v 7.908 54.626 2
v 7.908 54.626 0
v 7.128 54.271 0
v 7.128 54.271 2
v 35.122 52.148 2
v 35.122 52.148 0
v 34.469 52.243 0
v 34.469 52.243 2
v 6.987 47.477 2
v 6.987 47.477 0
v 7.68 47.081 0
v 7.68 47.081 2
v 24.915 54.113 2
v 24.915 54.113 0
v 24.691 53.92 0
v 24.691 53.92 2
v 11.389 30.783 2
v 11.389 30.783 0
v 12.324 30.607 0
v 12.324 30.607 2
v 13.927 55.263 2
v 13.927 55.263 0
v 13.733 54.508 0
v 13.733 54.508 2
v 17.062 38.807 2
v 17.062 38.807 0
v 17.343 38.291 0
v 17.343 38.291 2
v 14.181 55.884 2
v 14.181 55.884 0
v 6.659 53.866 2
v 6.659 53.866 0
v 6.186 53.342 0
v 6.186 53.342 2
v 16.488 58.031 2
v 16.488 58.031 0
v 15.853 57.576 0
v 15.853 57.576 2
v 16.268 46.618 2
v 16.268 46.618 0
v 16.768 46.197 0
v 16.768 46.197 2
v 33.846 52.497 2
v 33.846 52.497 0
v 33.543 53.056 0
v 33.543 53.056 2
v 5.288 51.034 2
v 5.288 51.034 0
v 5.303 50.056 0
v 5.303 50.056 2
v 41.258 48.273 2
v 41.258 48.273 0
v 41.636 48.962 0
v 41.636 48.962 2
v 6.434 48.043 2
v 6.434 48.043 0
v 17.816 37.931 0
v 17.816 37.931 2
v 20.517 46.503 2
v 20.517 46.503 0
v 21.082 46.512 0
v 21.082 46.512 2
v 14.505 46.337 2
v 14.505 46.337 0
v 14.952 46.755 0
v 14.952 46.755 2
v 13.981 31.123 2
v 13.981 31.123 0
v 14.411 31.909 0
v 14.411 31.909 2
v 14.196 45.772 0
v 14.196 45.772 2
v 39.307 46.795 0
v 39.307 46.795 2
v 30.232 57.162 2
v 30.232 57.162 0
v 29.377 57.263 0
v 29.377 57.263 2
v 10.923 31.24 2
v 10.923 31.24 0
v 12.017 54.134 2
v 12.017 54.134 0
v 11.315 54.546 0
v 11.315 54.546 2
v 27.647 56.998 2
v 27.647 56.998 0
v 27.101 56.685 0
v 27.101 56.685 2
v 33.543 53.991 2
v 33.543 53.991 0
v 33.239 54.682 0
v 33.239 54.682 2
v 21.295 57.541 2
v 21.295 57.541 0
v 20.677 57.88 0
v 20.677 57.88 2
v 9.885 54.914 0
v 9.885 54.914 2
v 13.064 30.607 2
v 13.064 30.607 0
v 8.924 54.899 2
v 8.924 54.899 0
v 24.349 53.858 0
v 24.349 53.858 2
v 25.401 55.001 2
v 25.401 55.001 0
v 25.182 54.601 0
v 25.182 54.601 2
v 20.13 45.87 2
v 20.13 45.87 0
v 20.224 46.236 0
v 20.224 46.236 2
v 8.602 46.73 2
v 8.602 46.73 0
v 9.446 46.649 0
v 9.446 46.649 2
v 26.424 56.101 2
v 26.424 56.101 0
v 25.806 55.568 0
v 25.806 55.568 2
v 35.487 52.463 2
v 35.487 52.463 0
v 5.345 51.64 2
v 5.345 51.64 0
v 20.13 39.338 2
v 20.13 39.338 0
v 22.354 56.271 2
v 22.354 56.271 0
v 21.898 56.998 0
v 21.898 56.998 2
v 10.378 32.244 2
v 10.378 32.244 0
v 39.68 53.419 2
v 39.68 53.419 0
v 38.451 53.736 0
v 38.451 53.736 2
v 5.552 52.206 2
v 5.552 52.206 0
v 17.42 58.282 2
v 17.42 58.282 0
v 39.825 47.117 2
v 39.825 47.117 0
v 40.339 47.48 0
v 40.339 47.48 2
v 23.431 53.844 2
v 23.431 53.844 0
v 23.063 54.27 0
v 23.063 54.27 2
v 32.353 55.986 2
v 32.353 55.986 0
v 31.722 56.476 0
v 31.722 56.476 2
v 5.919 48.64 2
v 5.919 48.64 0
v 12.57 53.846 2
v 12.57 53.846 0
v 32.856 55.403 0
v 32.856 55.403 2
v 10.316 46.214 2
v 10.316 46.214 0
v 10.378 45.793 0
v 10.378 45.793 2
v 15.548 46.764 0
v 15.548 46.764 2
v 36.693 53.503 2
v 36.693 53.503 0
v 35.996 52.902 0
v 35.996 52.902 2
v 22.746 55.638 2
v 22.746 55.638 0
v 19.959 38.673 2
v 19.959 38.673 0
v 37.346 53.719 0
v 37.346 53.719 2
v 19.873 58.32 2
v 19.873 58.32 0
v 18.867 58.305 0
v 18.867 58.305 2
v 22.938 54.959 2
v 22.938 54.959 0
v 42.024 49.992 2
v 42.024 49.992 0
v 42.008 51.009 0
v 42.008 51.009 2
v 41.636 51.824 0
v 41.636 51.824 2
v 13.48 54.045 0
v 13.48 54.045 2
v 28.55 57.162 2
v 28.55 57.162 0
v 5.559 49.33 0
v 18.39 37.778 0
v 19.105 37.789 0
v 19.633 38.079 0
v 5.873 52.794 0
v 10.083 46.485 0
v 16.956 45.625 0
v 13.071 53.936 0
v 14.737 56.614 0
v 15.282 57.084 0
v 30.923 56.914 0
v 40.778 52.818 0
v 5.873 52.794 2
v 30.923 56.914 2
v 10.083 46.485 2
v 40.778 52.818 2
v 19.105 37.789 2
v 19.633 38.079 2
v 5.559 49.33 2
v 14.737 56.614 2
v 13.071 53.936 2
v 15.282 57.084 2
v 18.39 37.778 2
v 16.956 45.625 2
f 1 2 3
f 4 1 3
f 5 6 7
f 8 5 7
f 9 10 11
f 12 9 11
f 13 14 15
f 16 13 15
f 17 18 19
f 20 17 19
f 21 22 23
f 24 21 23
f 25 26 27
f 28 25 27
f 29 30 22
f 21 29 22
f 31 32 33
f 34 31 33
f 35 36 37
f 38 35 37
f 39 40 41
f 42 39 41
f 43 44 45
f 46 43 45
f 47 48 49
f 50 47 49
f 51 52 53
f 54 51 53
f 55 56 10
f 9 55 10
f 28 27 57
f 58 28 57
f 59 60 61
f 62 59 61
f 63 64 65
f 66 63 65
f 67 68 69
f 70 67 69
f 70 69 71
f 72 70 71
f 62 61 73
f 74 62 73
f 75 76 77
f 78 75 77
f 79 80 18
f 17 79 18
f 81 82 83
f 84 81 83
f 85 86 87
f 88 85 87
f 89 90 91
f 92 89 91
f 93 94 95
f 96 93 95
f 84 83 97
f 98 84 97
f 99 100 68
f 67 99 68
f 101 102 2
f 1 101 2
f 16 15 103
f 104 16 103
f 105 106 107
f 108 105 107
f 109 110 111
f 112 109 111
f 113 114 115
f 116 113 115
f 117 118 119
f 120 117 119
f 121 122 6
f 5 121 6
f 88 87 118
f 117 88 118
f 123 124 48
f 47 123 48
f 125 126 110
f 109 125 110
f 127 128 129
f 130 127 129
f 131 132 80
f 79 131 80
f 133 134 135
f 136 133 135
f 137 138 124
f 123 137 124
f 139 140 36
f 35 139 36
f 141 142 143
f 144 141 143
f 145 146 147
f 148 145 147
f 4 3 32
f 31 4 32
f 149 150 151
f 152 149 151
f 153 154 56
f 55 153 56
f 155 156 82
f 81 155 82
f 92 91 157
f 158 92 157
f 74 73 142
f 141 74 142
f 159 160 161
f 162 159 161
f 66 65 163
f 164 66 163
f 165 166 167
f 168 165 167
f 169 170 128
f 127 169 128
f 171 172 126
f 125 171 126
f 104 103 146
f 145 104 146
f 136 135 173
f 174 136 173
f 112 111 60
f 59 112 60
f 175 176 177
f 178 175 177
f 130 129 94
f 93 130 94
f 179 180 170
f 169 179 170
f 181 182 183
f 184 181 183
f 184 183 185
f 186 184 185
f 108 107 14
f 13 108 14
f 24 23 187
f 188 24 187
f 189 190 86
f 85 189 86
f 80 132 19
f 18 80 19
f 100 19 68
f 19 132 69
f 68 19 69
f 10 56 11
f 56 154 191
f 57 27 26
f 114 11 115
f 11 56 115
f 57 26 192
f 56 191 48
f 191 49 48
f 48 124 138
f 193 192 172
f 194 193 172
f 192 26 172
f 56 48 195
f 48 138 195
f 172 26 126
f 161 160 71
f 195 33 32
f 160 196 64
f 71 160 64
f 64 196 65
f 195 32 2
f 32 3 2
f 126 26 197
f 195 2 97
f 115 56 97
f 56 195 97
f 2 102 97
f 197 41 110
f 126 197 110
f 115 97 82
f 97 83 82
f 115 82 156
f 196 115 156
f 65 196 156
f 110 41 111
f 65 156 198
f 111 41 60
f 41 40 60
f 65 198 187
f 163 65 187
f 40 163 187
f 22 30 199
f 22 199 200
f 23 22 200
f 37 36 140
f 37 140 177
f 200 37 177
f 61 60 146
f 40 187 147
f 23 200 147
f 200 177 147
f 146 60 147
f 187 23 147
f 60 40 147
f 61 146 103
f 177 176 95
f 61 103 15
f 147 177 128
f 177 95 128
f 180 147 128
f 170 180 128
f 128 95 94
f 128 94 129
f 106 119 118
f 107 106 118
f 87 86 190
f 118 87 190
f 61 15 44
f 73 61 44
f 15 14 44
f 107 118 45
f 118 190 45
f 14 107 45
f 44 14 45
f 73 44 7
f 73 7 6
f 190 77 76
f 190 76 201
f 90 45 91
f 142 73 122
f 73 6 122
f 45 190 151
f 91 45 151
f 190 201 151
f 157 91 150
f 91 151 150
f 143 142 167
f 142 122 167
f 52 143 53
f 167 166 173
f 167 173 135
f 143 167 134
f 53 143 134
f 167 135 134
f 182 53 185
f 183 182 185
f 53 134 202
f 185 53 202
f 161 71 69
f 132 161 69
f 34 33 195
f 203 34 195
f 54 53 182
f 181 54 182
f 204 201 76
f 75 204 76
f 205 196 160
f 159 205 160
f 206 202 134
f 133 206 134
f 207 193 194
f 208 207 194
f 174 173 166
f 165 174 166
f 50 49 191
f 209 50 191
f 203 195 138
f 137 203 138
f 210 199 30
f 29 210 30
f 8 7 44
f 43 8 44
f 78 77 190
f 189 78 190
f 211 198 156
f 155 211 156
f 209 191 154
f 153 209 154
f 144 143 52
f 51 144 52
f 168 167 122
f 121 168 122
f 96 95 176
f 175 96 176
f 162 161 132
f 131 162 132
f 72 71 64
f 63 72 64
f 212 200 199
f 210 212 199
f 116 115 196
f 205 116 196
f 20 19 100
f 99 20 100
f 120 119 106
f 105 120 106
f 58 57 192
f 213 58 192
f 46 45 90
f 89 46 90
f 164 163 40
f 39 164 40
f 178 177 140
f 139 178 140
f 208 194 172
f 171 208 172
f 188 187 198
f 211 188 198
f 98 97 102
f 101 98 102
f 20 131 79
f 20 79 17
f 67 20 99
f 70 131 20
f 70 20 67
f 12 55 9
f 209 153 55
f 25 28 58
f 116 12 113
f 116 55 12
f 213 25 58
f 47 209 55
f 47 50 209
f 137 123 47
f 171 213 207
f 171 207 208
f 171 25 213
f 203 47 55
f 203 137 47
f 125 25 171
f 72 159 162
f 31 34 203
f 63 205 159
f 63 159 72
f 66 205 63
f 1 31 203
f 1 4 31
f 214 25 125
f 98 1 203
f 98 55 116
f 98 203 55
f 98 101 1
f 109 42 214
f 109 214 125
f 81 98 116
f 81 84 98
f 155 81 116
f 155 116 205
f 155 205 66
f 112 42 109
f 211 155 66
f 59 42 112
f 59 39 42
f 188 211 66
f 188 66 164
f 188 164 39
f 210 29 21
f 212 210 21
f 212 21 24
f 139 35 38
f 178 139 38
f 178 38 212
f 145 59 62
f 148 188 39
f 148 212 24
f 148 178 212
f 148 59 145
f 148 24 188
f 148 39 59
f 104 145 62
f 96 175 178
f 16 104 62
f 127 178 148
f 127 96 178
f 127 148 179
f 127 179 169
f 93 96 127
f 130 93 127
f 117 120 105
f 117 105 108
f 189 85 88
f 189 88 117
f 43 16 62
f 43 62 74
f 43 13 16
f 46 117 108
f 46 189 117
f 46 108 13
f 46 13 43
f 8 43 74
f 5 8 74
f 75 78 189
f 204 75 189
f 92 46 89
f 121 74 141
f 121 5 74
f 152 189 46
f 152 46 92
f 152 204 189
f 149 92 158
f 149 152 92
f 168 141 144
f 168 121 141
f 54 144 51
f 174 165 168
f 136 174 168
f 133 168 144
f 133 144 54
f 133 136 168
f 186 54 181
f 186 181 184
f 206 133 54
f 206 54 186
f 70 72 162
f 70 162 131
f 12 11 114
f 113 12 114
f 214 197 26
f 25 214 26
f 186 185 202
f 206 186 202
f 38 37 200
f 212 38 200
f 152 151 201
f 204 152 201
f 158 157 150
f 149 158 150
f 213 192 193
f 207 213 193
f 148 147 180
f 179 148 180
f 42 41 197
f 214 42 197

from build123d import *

# Parameters (mm, degrees)
F1_DEPTH = 2


with BuildPart() as f1:
    # F0 (on Top) → F1 (new body)
    with BuildSketch(Plane.XY):
        Polygon((10.316424, 46.21381), (10.378422, 45.792866), (10.378422, 32.24406), (10.922515, 31.239605), (11.388969, 30.782871), (12.3236, 30.607224), (13.063584, 30.607224), (13.980744, 31.123197), (14.411193, 31.909108), (14.195969, 45.771692), (14.505405, 46.336659), (14.951889, 46.75483), (15.547823, 46.764082), (16.267732, 46.618171), (16.767925, 46.196714), (16.955901, 45.625031), (17.061751, 38.807264), (17.342532, 38.290832), (17.816337, 37.93142), (18.39029, 37.777532), (19.1046, 37.788622), (19.633163, 38.07852), (19.958686, 38.672859), (20.130083, 39.338022), (20.130083, 45.869723), (20.224372, 46.235643), (20.517316, 46.503272), (21.081642, 46.512033), (39.306525, 46.794985), (39.82532, 47.116615), (40.338621, 47.479954), (41.258305, 48.273247), (41.635639, 48.962181), (42.02386, 49.992487), (42.008081, 51.008835), (41.635639, 51.823597), (40.777957, 52.81793), (39.679653, 53.419479), (38.45059, 53.736179), (37.345576, 53.719023), (36.693033, 53.5032), (35.996381, 52.902289), (35.486977, 52.462892), (35.121937, 52.148019), (34.468539, 52.243274), (33.846248, 52.497253), (33.542935, 53.056076), (33.542935, 53.990863), (33.238664, 54.682236), (32.856002, 55.402562), (32.352884, 55.98584), (31.721991, 56.476444), (30.923305, 56.91389), (30.231845, 57.161622), (29.377455, 57.263315), (28.54972, 57.161622), (27.647492, 56.998174), (27.101057, 56.685288), (26.424225, 56.101473), (25.806281, 55.568452), (25.401196, 55.0007), (25.182293, 54.601029), (24.914882, 54.112791), (24.691492, 53.920102), (24.348679, 53.857998), (23.43077, 53.843747), (23.063278, 54.269789), (22.938367, 54.959297), (22.745963, 55.637598), (22.354444, 56.271017), (21.897662, 56.998174), (21.295404, 57.541236), (20.676884, 57.880004), (19.87285, 58.320378), (18.866845, 58.30476), (17.419982, 58.282296), (16.487831, 58.031149), (15.852839, 57.576239), (15.281766, 57.083648), (14.737288, 56.613998), (14.181019, 55.884421), (13.927415, 55.262856), (13.732859, 54.507815), (13.479641, 54.045492), (13.071425, 53.935507), (12.569794, 53.845812), (12.017341, 54.134376), (11.315221, 54.545794), (9.885113, 54.914299), (8.924496, 54.899385), (7.908149, 54.625553), (7.127685, 54.270785), (6.658861, 53.866391), (6.18615, 53.341925), (5.873267, 52.793737), (5.551593, 52.206428), (5.345334, 51.640082), (5.28802, 51.033568), (5.30319, 50.05647), (5.558579, 49.329612), (5.919253, 48.639685), (6.434358, 48.04251), (6.987177, 47.476605), (7.680411, 47.080936), (8.60151, 46.729587), (9.445827, 46.648875), (10.082705, 46.484766), align=None)
    extrude(amount=F1_DEPTH)


solid = f1.part
